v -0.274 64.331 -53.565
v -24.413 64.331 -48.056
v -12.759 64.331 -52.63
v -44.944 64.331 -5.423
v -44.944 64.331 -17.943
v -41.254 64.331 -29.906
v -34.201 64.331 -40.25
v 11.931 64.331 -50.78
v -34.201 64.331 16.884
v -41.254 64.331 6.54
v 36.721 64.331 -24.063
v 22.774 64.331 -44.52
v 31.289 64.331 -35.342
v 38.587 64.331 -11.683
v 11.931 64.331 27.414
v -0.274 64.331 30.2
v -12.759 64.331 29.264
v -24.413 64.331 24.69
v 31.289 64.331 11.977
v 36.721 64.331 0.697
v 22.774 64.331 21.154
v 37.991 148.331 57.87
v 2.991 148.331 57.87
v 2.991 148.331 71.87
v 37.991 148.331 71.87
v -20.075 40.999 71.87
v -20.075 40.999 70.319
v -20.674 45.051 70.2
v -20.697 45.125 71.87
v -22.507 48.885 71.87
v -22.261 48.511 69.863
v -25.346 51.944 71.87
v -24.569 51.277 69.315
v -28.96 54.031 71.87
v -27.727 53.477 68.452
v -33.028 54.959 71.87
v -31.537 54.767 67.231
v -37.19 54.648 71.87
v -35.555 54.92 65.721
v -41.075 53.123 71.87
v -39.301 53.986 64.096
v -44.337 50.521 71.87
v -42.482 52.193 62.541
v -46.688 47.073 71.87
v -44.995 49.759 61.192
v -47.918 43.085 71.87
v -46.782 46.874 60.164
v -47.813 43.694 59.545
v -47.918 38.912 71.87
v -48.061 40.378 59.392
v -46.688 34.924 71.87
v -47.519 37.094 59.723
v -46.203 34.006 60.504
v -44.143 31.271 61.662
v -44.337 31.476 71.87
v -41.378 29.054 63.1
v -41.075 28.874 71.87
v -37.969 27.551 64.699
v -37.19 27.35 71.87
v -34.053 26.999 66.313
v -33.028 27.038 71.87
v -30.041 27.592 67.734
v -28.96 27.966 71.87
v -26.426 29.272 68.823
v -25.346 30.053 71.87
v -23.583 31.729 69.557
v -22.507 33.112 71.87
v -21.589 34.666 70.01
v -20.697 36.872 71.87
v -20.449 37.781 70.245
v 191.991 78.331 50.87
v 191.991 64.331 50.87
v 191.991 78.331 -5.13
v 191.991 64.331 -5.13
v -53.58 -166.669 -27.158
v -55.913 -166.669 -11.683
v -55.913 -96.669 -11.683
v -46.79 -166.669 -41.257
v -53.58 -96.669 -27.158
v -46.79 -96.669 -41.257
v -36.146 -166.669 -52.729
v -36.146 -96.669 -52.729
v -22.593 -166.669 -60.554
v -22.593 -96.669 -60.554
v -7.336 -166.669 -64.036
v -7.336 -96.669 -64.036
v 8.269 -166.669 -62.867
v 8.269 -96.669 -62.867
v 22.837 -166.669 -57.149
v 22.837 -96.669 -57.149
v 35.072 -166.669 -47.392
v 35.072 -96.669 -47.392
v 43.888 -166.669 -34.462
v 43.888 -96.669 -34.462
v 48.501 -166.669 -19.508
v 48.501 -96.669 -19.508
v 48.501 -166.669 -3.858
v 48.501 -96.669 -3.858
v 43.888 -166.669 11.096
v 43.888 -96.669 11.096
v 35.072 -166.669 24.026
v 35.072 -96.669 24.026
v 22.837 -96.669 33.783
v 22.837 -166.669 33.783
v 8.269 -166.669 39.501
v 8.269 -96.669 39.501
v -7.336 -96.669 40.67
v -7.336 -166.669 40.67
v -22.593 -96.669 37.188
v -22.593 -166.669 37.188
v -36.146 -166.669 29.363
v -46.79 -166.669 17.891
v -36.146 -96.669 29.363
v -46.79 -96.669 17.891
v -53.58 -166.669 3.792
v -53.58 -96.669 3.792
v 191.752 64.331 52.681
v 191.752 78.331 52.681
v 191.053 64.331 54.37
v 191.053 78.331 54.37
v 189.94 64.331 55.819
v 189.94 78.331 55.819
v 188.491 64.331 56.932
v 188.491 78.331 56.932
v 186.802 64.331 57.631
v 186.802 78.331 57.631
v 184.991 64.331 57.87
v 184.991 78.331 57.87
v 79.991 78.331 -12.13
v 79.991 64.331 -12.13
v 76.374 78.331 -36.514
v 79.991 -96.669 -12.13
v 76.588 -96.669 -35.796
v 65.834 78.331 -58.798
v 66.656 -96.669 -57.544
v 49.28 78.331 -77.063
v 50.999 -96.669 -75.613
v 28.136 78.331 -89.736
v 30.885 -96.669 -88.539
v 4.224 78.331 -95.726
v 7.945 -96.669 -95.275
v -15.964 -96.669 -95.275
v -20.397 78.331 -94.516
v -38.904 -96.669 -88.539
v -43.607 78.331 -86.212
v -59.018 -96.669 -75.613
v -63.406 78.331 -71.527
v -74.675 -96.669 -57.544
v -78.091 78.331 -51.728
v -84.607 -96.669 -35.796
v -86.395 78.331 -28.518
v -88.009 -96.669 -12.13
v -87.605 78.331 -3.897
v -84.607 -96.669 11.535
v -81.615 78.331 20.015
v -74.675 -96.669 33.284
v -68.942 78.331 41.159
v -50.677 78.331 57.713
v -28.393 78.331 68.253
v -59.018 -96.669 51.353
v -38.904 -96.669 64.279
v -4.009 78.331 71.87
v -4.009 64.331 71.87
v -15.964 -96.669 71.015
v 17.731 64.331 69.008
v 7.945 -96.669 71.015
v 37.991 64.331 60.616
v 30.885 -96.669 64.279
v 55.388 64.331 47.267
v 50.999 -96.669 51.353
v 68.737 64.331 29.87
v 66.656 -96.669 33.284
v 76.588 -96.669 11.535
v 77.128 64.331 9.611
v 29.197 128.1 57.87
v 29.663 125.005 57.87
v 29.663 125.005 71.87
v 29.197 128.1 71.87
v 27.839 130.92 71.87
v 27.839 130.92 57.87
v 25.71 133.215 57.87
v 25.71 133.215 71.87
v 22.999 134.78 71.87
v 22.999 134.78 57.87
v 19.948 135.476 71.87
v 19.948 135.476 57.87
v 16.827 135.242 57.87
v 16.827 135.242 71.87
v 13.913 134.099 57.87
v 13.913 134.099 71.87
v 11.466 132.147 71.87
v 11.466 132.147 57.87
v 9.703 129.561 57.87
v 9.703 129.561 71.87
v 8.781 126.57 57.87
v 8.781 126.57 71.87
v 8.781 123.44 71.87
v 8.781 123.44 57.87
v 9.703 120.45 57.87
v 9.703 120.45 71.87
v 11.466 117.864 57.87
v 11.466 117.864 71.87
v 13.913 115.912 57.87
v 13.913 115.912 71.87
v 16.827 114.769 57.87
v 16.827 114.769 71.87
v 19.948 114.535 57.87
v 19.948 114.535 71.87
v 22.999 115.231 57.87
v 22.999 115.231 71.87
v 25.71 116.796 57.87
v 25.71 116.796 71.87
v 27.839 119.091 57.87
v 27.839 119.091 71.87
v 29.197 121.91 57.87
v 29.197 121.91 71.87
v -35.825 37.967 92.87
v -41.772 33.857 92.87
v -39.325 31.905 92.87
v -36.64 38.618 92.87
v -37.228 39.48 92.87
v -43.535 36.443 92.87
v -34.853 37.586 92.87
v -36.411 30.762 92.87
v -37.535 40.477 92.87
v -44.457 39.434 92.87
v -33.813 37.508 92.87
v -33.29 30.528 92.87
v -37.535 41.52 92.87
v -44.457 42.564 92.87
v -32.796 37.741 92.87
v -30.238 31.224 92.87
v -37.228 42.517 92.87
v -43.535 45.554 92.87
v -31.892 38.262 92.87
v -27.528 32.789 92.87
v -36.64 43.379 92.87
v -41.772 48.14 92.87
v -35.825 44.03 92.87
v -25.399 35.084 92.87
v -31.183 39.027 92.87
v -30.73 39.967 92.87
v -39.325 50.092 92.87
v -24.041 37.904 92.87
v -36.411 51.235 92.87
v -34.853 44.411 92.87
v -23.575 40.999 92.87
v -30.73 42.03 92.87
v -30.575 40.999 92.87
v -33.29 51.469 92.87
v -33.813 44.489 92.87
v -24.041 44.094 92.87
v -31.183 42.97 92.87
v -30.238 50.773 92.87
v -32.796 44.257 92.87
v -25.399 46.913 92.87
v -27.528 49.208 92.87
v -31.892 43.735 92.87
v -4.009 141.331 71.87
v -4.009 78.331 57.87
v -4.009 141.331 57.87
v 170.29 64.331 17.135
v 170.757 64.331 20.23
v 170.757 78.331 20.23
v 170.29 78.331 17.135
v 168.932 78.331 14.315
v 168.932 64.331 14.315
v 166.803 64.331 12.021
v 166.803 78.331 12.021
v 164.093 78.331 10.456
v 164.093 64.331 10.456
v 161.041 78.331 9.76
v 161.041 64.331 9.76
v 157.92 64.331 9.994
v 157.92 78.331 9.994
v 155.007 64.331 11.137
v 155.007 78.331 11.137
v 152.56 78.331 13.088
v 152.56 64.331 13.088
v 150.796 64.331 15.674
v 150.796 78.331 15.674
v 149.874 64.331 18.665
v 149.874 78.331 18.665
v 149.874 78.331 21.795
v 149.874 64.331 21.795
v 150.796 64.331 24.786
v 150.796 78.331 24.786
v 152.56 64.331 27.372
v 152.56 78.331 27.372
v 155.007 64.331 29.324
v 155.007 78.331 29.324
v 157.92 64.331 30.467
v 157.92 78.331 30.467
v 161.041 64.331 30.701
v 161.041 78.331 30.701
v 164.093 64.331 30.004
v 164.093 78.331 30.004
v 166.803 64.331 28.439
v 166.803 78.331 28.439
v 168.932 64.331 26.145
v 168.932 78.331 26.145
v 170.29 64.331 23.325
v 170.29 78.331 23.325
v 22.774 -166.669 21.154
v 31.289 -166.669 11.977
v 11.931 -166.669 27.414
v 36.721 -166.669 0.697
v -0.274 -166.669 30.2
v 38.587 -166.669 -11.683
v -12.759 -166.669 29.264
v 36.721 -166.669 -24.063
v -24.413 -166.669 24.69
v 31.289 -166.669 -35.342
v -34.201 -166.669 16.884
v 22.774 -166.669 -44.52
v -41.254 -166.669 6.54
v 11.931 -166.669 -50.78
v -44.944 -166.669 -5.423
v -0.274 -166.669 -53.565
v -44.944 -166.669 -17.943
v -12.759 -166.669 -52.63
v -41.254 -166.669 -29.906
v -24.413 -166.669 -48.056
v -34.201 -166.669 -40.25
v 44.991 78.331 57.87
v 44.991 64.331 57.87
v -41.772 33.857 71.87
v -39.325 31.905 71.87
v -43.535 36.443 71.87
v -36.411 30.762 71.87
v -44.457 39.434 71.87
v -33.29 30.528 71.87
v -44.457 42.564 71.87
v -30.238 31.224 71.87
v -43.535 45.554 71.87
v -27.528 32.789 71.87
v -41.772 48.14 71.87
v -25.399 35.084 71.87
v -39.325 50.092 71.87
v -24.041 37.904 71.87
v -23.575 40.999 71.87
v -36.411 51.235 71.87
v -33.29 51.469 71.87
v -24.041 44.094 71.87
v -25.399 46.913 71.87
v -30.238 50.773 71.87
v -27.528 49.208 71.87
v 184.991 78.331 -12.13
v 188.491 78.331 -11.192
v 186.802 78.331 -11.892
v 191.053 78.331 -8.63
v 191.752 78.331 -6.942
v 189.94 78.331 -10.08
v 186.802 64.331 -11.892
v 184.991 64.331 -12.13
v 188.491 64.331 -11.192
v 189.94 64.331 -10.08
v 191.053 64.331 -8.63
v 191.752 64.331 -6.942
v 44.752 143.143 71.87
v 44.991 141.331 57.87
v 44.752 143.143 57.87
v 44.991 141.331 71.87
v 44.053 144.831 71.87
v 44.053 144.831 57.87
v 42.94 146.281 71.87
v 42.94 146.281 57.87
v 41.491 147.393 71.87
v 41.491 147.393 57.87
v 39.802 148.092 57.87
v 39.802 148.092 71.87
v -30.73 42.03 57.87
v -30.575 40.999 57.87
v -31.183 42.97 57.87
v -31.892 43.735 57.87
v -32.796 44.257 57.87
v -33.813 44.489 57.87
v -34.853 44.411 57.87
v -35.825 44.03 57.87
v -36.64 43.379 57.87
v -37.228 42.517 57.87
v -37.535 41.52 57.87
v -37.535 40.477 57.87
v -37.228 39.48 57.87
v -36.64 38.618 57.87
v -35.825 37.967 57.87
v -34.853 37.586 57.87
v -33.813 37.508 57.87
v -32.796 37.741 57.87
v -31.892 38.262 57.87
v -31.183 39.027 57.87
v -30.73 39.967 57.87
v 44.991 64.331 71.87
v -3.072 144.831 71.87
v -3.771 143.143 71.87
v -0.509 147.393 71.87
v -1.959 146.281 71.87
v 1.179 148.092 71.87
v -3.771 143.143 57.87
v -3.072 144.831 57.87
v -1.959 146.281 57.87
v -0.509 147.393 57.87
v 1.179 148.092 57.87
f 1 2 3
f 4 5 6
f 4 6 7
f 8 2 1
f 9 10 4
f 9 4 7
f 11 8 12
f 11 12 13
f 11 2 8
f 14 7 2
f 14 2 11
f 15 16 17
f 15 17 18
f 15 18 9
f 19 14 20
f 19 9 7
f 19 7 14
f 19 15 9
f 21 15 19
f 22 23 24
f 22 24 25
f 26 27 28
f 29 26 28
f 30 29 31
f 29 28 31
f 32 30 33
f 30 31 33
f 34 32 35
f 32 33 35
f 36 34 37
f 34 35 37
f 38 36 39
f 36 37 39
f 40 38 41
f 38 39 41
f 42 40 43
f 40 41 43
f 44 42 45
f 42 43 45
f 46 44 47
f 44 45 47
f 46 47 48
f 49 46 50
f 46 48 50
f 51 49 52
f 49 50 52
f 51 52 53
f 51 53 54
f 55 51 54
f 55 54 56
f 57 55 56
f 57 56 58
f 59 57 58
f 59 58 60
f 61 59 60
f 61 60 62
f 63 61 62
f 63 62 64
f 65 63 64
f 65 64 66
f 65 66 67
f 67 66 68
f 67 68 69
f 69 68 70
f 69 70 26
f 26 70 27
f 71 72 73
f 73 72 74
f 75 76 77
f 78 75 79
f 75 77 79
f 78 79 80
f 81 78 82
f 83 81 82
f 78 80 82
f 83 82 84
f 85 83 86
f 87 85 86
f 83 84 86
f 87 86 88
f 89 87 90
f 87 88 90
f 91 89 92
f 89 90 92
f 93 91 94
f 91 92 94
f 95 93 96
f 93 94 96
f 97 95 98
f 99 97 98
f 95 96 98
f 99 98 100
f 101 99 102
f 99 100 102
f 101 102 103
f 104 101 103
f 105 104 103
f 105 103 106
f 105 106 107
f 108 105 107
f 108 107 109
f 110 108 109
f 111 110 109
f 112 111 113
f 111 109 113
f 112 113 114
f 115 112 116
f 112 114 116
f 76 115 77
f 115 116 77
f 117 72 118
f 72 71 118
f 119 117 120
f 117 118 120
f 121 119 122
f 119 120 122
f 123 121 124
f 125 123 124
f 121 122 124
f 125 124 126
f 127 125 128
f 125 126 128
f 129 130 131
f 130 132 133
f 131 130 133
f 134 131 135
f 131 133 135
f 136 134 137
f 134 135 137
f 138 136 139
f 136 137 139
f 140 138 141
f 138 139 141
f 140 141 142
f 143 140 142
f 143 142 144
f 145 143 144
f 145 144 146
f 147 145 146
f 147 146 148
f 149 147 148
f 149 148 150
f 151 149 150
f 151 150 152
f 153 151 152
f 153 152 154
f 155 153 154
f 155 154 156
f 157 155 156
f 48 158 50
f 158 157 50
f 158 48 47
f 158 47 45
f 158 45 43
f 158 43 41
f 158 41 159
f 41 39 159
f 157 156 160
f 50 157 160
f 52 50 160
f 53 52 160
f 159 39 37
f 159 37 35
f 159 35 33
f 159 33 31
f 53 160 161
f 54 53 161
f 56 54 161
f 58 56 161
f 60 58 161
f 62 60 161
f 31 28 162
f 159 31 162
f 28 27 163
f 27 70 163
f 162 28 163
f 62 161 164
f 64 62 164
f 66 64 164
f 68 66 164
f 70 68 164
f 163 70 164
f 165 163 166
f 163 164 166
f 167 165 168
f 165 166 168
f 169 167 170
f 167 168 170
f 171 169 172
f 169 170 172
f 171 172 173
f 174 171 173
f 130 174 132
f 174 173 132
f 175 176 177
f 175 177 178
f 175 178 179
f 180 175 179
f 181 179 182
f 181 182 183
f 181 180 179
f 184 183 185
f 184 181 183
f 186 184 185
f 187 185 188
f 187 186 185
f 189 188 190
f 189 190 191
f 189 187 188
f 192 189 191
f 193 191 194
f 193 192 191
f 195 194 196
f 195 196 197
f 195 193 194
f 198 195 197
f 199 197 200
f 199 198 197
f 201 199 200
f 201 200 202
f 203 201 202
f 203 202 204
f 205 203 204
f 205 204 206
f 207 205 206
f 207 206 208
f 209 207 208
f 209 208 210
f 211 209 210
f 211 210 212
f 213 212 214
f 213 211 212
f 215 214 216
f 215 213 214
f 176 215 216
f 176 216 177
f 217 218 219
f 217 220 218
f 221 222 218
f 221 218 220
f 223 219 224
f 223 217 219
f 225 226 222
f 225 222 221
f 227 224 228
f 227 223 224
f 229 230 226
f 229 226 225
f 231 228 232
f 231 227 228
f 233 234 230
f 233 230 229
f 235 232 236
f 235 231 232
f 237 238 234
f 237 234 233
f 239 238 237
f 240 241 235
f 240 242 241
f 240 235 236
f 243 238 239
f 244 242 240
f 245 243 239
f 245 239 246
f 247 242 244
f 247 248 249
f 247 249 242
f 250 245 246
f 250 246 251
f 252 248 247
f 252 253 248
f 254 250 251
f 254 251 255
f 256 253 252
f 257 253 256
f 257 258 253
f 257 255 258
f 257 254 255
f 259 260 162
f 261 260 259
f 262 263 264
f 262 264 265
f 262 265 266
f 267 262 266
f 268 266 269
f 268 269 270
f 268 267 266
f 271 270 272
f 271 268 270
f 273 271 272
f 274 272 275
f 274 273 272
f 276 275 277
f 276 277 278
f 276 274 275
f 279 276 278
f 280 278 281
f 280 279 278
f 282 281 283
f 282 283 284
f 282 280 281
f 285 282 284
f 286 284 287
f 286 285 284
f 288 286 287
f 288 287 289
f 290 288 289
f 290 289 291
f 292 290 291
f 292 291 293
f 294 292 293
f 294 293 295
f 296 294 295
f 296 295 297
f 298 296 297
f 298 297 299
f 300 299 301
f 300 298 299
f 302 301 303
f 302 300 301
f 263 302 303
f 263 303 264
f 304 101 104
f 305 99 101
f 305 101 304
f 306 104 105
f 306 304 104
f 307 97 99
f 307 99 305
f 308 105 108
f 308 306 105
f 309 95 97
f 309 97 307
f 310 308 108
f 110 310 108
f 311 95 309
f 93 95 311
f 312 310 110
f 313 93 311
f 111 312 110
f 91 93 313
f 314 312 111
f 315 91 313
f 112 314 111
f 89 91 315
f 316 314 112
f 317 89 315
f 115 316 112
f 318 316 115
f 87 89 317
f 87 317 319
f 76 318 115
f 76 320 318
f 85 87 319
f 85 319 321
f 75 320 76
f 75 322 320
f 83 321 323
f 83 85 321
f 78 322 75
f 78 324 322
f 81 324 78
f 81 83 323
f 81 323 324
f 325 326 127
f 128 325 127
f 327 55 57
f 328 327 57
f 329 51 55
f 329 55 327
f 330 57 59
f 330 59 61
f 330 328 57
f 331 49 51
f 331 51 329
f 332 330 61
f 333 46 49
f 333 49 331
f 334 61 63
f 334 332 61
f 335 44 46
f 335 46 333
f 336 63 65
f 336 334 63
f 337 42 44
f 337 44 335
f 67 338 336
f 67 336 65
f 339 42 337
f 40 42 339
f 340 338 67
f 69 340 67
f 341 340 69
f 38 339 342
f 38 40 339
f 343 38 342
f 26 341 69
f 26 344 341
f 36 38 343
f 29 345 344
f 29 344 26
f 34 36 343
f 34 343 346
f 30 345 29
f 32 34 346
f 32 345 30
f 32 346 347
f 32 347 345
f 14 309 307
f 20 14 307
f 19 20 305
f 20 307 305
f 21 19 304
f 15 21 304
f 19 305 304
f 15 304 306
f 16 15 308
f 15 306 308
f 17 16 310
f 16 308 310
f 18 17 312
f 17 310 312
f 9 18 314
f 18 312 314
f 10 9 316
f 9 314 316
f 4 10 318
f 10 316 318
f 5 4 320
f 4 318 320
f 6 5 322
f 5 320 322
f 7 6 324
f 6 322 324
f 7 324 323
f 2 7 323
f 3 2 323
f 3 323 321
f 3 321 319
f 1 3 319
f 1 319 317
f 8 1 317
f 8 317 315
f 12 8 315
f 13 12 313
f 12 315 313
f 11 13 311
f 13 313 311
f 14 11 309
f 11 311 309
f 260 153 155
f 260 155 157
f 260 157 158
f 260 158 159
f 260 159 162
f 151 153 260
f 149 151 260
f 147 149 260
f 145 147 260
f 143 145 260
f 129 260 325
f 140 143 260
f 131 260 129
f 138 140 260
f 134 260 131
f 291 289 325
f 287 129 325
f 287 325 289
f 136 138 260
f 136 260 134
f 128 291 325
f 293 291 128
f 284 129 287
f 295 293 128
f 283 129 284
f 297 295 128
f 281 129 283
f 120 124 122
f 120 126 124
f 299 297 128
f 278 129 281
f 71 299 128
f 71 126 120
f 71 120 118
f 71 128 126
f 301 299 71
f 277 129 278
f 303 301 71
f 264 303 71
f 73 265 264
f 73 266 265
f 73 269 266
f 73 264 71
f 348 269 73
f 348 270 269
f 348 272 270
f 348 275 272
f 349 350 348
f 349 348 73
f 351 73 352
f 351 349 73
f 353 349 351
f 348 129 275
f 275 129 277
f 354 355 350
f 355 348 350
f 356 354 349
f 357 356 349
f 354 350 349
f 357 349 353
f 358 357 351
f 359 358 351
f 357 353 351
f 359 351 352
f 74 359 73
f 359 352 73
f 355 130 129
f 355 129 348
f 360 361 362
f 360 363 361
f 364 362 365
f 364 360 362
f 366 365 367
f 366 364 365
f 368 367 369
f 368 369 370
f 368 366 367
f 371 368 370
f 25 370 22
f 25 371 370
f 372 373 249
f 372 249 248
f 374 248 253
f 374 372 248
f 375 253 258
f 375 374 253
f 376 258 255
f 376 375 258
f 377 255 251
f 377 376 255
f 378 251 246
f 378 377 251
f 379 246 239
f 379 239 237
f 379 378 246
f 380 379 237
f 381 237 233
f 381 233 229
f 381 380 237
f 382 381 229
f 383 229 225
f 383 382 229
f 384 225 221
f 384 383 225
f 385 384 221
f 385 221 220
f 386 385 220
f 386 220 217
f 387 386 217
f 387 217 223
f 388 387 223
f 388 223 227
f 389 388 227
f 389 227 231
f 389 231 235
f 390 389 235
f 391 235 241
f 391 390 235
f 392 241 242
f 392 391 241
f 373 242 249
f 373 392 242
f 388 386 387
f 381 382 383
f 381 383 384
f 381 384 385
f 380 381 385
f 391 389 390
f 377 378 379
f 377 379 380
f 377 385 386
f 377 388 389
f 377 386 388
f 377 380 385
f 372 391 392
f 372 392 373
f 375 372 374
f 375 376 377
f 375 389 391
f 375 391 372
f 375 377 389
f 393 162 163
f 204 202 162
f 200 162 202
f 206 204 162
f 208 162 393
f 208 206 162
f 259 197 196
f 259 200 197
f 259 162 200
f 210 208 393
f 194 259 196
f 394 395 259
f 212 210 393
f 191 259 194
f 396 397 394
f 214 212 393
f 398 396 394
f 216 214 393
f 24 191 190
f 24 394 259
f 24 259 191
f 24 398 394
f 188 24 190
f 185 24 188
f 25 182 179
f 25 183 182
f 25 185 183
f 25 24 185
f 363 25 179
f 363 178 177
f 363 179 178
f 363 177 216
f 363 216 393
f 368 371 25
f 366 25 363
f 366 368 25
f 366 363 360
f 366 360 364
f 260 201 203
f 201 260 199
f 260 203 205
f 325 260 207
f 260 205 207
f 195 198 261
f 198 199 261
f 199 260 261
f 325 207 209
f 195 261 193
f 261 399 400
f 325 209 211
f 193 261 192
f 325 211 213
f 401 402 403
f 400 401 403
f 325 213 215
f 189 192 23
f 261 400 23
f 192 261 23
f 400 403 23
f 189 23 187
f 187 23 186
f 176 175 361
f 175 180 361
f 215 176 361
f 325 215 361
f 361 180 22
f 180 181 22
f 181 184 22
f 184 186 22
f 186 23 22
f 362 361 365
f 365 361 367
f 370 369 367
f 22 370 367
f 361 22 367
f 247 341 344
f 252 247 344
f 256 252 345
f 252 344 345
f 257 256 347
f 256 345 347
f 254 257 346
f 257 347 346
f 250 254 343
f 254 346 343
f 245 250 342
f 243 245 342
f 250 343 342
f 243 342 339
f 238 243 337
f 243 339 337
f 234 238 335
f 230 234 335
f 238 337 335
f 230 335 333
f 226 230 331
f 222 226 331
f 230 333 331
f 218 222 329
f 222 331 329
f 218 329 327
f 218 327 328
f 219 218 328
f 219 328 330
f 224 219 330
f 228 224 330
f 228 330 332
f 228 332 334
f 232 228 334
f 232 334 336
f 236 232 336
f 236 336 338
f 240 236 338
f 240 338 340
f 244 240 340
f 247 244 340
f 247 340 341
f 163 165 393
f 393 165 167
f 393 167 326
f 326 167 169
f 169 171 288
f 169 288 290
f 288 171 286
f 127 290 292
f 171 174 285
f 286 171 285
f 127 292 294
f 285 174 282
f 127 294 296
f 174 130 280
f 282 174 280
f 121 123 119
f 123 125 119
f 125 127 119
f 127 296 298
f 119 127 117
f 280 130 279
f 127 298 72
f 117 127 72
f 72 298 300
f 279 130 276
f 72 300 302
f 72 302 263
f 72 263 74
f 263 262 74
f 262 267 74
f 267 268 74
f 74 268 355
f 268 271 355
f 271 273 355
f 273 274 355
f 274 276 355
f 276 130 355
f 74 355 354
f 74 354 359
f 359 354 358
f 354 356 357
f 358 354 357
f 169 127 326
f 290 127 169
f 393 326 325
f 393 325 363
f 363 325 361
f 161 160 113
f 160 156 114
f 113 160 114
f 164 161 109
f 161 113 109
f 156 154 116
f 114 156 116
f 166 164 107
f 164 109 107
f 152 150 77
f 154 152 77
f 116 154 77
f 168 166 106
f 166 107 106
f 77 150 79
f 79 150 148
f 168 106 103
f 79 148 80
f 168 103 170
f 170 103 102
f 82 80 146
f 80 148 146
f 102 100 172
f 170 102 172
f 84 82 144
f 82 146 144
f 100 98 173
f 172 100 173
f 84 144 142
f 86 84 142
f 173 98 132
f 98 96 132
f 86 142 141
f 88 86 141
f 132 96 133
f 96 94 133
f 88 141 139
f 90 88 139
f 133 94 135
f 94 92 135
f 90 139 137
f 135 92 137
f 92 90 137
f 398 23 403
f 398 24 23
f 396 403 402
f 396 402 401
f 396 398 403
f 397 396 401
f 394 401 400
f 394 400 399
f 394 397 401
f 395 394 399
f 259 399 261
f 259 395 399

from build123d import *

# Parameters (mm, degrees)
CROQUIS1_W                   = 28
CROQUIS1_H                   = 10
SALIENTE_EXTRUIR1_DEPTH      = 2
CROQUIS5_W                   = 7
CROQUIS5_H                   = 12
SALIENTE_EXTRUIR5_DEPTH      = 2
SALIENTE_EXTRUIR6_DEPTH      = 2
SALIENTE_EXTRUIR6_DEPTH_BACK = 23
CROQUIS6_R                   = 12
CROQUIS9_R                   = 7.5
SALIENTE_EXTRUIR7_DEPTH      = 10
CROQUIS10_R                  = 6
CORTAR_EXTRUIR3_DEPTH        = 33
REDONDEO2_R                  = 1
REDONDEO3_R                  = 1
REDONDEO4_R                  = 1
REDONDEO5_R                  = 1
CROQUIS12_R                  = 1.5
CORTAR_EXTRUIR4_DEPTH        = 2
CROQUIS13_R                  = 1.5
CORTAR_EXTRUIR7_DEPTH        = 2
CROQUIS16_R                  = 2
SALIENTE_EXTRUIR9_DEPTH      = 2
CROQUIS17_R                  = 1.5
SALIENTE_EXTRUIR10_DEPTH     = 5
CROQUIS18_R                  = 0.5
CORTAR_EXTRUIR8_DEPTH        = 5
ESCALA1_SCALE                = 7


with BuildPart() as part:
    # Croquis1 → Saliente-Extruir1 (new body)
    with BuildSketch(Plane(origin=(0, 0, 0), x_dir=(1, 0, 0), z_dir=(0, 1, 0))):
        with Locations((14, 5)):
            Rectangle(CROQUIS1_W, CROQUIS1_H)
    extrude(amount=SALIENTE_EXTRUIR1_DEPTH)

    # Croquis5 → Saliente-Extruir5 (add)
    with BuildSketch(Plane.XY):
        with Locations((3.5, 6)):
            Rectangle(CROQUIS5_W, CROQUIS5_H)
    extrude(amount=SALIENTE_EXTRUIR5_DEPTH)

    # Croquis6 → Saliente-Extruir6 (add, two sides: drawn at the far end of the back side and taken through both)
    with BuildSketch(Plane(origin=(0, 0, 0), x_dir=(1, 0, 0), z_dir=(0, 1, 0)).offset(-SALIENTE_EXTRUIR6_DEPTH_BACK)):
        with Locations((0, 10)):
            Circle(CROQUIS6_R)
    extrude(amount=SALIENTE_EXTRUIR6_DEPTH + SALIENTE_EXTRUIR6_DEPTH_BACK)

    # Croquis9 → Saliente-Extruir7 (add)
    with BuildSketch(Plane(origin=(0, -23, 0), x_dir=(-1, 0, 0), z_dir=(0, -1, 0))):
        with Locations((-0.08521531, 9.936088517)):
            Circle(CROQUIS9_R)
    extrude(amount=SALIENTE_EXTRUIR7_DEPTH)

    # Croquis10 → Cortar-Extruir3 (cut)
    with BuildSketch(Plane.XZ.offset(33)):
        with Locations((0.08521531, -9.936088517)):
            Circle(CROQUIS10_R)
    extrude(amount=-CORTAR_EXTRUIR3_DEPTH, mode=Mode.SUBTRACT)

    # Redondeo2
    redondeo2_edges = [part.edges().sort_by_distance(p)[0] for p in [
        (28, 1, -10),
    ]]
    fillet(redondeo2_edges, radius=REDONDEO2_R)

    # Redondeo3
    redondeo3_edges = [part.edges().sort_by_distance(p)[0] for p in [
        (28, 1, 0),
    ]]
    fillet(redondeo3_edges, radius=REDONDEO3_R)

    # Redondeo4
    redondeo4_edges = [part.edges().sort_by_distance(p)[0] for p in [
        (7, 12, 1),
    ]]
    fillet(redondeo4_edges, radius=REDONDEO4_R)

    # Redondeo5
    redondeo5_edges = [part.edges().sort_by_distance(p)[0] for p in [
        (0, 12, 1),
    ]]
    fillet(redondeo5_edges, radius=REDONDEO5_R)

    # Croquis12 → Cortar-Extruir4 (cut)
    with BuildSketch(Plane.XY):
        with Locations((3.310400977, 8.667805531)):
            Circle(CROQUIS12_R)
    extrude(amount=CORTAR_EXTRUIR4_DEPTH, mode=Mode.SUBTRACT)

    # Croquis13 → Cortar-Extruir7 (cut)
    with BuildSketch(Plane(origin=(0, 0, 0), x_dir=(1, 0, 0), z_dir=(0, 1, 0))):
        with Locations((23.466578788, 5.377069426)):
            Circle(CROQUIS13_R)
    extrude(amount=CORTAR_EXTRUIR7_DEPTH, mode=Mode.SUBTRACT)

    # Croquis16 → Saliente-Extruir9 (add)
    with BuildSketch(Plane.XY):
        with Locations((-4.295016908, -3.333173785)):
            Circle(CROQUIS16_R)
    extrude(amount=SALIENTE_EXTRUIR9_DEPTH)

    # Croquis17 → Saliente-Extruir10 (add)
    with BuildSketch(Plane.XY):
        with Locations((-4.295016908, -3.333173785)):
            Circle(CROQUIS17_R)
    extrude(amount=SALIENTE_EXTRUIR10_DEPTH)

    # Croquis18 → Cortar-Extruir8 (cut)
    with BuildSketch(Plane.XY):
        with Locations((-4.295016908, -3.333173785)):
            Circle(CROQUIS18_R)
    extrude(amount=CORTAR_EXTRUIR8_DEPTH, mode=Mode.SUBTRACT)


with BuildPart() as part_1:
    # Escala1: scaled about (0.668234769, -10.721798359, -9.644957582)
    add(part.part.scale(ESCALA1_SCALE).moved(Location((-4.009408614, 64.330790154, 57.869745492))))


solid = part_1.part
